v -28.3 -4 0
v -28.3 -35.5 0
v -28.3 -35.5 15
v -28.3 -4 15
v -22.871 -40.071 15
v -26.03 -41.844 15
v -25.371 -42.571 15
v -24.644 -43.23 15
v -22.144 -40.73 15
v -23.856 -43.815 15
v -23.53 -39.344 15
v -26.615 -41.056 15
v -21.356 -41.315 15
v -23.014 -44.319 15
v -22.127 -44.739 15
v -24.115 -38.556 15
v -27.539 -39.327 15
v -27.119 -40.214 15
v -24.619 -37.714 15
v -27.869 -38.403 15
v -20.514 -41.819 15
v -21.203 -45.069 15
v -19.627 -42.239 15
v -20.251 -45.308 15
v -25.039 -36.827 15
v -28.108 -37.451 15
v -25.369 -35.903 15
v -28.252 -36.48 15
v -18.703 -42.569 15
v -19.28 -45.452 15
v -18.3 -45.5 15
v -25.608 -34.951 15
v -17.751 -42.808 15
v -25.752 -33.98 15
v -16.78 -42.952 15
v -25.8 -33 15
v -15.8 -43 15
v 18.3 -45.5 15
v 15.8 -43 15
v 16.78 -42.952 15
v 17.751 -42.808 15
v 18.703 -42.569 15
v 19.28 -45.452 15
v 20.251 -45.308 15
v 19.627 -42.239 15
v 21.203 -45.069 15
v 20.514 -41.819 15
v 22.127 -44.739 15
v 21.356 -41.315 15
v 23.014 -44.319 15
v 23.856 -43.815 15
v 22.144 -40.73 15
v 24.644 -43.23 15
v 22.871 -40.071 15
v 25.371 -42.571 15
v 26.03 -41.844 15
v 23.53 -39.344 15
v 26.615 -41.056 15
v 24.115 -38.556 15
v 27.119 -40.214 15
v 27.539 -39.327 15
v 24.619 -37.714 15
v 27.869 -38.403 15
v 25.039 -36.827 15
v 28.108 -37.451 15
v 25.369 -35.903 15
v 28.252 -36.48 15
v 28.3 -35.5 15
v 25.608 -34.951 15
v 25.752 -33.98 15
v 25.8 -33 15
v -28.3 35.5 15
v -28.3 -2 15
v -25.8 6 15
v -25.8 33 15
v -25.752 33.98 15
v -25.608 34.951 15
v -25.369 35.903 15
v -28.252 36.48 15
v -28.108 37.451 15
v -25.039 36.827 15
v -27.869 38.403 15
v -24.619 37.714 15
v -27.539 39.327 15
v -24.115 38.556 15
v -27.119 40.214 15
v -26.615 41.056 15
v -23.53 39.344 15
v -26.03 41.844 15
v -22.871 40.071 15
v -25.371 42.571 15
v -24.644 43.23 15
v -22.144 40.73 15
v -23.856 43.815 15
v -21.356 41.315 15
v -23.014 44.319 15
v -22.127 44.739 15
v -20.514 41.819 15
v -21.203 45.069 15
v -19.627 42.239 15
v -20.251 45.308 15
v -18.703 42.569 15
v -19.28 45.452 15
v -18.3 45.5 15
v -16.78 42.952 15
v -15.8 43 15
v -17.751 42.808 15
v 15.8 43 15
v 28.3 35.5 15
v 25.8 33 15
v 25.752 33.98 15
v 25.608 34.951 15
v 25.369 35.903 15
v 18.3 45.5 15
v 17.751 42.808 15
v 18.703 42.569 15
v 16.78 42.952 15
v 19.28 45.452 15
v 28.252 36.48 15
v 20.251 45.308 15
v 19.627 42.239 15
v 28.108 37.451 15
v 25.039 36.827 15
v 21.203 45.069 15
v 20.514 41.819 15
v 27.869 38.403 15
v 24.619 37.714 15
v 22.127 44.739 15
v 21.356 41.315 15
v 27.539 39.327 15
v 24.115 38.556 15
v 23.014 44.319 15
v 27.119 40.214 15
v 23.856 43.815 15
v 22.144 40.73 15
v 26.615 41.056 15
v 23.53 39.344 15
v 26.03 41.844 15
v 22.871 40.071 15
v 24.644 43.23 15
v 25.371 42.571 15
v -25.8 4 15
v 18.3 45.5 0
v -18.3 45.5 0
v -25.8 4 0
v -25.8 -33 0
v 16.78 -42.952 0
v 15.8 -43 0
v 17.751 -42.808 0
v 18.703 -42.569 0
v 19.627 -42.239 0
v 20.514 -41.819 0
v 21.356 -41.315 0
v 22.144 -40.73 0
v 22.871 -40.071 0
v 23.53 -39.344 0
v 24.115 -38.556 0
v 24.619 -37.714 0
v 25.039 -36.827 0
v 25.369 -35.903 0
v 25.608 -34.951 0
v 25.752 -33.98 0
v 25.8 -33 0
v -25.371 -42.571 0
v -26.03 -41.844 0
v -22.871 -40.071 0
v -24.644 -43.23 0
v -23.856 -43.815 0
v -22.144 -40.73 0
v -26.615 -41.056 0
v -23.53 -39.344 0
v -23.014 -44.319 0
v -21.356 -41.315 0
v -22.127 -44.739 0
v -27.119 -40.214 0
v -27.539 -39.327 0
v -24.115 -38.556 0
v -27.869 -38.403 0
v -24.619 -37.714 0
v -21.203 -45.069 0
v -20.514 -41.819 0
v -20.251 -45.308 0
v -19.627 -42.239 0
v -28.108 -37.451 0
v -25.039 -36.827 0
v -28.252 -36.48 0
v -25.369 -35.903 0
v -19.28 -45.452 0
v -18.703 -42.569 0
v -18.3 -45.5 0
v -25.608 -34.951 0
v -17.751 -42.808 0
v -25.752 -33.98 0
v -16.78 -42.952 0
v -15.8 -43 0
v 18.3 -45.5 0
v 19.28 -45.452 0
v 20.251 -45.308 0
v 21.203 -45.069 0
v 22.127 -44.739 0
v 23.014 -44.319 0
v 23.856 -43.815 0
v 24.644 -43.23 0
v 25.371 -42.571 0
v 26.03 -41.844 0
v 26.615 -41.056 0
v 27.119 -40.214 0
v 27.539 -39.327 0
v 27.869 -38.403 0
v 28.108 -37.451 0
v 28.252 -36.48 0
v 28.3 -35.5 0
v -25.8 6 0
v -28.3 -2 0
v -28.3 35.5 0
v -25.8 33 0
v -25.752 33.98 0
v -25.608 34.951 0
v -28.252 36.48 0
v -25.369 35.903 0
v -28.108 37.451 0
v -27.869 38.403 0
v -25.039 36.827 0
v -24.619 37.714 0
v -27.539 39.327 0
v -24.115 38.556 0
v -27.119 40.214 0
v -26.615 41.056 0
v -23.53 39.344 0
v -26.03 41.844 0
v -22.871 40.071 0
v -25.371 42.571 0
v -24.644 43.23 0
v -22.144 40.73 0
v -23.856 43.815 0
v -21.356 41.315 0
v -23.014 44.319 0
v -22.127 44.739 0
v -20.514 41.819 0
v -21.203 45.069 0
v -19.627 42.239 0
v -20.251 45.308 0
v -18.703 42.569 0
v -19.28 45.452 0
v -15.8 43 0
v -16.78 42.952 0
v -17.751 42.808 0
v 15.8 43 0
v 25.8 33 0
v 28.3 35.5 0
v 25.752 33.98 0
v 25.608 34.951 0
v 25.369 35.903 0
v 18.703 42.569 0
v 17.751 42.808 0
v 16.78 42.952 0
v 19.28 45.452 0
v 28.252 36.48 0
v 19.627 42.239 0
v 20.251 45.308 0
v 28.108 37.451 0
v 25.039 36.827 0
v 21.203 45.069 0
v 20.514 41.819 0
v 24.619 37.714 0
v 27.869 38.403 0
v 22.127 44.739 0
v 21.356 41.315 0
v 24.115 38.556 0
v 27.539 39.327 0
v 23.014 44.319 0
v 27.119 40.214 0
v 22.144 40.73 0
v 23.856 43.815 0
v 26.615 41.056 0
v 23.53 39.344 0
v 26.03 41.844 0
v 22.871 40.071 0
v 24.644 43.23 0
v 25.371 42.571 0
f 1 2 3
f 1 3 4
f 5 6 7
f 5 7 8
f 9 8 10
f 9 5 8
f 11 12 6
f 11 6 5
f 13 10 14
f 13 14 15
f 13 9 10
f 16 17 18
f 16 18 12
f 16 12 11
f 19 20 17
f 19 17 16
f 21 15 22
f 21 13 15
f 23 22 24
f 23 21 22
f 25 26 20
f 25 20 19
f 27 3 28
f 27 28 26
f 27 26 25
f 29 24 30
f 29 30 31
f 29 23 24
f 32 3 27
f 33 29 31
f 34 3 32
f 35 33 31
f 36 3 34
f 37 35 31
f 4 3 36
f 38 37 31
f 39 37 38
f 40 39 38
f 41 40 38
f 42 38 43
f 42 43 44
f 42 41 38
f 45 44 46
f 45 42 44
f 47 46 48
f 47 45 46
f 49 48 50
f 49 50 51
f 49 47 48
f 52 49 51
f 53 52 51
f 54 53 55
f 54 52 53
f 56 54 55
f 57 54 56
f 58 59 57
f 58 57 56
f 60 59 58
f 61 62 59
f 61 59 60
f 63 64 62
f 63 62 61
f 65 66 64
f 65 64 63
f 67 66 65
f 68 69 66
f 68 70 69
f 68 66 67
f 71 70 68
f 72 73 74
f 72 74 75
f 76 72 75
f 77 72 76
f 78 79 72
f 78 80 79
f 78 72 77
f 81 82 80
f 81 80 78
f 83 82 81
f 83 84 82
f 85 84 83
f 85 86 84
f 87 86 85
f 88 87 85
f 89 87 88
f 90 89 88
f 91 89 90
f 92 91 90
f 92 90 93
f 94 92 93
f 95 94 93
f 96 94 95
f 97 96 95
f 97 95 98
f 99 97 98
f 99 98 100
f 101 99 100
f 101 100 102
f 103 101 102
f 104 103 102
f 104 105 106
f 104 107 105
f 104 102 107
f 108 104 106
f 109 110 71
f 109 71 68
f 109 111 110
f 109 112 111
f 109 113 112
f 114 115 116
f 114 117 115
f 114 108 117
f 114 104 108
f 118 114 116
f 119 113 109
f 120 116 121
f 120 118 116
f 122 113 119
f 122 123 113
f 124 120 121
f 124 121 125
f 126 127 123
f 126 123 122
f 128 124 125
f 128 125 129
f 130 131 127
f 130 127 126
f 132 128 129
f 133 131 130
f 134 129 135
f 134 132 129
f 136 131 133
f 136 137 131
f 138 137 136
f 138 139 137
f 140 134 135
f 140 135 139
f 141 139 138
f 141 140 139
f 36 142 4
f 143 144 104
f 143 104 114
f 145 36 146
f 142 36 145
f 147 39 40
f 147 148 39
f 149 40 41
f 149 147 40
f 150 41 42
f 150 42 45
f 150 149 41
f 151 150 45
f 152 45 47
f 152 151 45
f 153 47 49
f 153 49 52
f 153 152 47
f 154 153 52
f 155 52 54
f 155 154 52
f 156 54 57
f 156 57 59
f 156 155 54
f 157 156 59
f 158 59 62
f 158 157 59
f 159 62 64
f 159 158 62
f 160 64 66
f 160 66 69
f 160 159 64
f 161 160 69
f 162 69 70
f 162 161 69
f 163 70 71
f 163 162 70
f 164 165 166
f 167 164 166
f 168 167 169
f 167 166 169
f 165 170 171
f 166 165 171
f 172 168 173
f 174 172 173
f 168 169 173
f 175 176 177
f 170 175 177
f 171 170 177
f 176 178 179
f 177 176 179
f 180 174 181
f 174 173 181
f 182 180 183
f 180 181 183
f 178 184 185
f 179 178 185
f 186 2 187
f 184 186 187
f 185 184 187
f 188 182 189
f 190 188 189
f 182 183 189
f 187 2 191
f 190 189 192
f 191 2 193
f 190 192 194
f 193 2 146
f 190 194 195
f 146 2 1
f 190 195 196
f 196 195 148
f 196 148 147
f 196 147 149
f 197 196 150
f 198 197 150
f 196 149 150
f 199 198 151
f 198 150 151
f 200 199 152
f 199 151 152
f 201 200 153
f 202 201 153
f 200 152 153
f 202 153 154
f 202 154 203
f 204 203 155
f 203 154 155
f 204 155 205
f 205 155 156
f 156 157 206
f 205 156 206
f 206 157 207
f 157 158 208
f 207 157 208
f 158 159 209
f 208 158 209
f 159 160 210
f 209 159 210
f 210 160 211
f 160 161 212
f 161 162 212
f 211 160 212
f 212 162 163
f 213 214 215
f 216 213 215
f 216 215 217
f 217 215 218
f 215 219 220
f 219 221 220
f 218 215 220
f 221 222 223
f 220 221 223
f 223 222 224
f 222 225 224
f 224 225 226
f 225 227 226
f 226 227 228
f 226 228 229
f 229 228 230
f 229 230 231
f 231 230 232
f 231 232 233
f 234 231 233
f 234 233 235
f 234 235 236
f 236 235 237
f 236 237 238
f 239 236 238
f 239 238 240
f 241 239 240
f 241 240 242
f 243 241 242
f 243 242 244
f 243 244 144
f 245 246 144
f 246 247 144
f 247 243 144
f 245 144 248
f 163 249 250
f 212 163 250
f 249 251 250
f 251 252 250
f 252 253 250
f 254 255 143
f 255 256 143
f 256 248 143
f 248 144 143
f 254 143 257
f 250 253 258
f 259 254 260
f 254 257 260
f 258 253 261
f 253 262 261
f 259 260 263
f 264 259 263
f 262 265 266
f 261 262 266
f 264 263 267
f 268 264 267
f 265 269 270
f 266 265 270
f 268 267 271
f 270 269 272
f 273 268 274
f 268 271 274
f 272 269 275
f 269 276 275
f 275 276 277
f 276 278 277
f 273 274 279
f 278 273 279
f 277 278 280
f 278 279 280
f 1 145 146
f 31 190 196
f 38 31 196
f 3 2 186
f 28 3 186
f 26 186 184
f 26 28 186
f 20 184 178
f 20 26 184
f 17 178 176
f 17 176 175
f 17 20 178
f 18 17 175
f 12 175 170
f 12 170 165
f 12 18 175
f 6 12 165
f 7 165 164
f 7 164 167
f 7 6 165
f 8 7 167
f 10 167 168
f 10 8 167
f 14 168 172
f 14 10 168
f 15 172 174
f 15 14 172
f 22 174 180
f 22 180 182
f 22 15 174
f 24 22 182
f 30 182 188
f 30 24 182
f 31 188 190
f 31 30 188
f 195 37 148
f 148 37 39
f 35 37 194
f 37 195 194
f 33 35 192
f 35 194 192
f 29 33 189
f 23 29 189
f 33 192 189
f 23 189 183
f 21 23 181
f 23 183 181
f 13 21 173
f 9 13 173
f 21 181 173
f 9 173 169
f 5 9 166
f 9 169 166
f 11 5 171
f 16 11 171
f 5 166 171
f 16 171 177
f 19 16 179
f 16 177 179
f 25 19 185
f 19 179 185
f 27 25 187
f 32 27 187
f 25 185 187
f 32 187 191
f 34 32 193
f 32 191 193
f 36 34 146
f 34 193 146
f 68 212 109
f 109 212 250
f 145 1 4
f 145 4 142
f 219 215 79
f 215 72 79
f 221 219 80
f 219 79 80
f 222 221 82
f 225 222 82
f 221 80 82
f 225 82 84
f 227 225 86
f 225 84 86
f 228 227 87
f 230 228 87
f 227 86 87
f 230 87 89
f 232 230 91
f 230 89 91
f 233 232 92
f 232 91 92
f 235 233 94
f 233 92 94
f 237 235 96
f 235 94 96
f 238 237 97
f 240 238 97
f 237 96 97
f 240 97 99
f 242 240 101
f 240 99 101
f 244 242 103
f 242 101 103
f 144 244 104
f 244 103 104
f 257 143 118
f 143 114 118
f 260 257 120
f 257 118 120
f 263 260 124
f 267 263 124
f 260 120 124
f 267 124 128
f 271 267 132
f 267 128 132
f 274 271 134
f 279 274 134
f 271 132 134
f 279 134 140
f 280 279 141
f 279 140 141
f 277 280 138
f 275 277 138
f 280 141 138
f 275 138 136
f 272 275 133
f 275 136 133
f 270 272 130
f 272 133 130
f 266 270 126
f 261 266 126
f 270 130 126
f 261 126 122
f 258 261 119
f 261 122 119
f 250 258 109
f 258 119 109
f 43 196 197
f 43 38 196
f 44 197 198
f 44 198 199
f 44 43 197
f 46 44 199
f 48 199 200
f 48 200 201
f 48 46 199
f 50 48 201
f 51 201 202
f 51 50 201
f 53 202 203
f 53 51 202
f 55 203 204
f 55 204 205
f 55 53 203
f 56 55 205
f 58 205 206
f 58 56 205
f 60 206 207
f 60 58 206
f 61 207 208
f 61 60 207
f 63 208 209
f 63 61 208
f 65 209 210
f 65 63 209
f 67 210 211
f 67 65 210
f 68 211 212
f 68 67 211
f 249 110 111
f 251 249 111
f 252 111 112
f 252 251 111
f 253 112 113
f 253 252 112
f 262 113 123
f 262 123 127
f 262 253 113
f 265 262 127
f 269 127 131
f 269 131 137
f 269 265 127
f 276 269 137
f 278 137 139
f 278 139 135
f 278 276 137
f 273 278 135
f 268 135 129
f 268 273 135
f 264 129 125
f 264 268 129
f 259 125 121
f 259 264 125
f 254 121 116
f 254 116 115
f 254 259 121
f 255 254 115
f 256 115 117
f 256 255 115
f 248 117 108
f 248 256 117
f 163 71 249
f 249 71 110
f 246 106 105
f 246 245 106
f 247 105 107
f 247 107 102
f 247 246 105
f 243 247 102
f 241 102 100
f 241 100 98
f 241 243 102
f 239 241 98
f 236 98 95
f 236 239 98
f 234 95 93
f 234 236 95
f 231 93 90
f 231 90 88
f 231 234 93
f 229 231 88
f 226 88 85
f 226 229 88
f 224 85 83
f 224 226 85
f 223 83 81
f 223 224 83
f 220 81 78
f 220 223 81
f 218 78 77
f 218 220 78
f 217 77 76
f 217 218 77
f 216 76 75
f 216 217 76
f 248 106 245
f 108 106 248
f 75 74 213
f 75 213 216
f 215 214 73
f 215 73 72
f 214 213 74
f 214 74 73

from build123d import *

# Parameters (mm, degrees)
F0_W     = 56.6
F0_H     = 91
F1_DEPTH = 15
F2_W     = 51.6
F2_H     = 86
F3_DEPTH = 25
F4_R     = 10
F6_DEPTH = 25


with BuildPart() as f1:
    # F0 (on Top) → F1 (new body)
    with BuildSketch(Plane.XY):
        Rectangle(F0_W, F0_H)
    extrude(amount=F1_DEPTH)

    # F2 (on face) → F3 (cut)
    with BuildSketch(Plane.XY.offset(15)):
        Rectangle(F2_W, F2_H)
    extrude(amount=-F3_DEPTH, mode=Mode.SUBTRACT)

    # F4
    f4_edges = [f1.edges().sort_by_distance(p)[0] for p in [
        (28.3, -45.5, 7.5),
        (28.3, 45.5, 7.5),
        (-28.3, -45.5, 7.5),
        (-28.3, 45.5, 7.5),
        (25.8, 43, 7.5),
        (-25.8, 43, 7.5),
        (-25.8, -43, 7.5),
        (25.8, -43, 7.5),
    ]]
    fillet(f4_edges, radius=F4_R)

    # F5 (on face) → F6 (cut)
    with BuildSketch(Plane.XY.offset(15)):
        Polygon((-28.3, -2), (-28.3, -4), (-25.8, 4), (-25.8, 6), align=None)
    extrude(amount=-F6_DEPTH, mode=Mode.SUBTRACT)


solid = f1.part
